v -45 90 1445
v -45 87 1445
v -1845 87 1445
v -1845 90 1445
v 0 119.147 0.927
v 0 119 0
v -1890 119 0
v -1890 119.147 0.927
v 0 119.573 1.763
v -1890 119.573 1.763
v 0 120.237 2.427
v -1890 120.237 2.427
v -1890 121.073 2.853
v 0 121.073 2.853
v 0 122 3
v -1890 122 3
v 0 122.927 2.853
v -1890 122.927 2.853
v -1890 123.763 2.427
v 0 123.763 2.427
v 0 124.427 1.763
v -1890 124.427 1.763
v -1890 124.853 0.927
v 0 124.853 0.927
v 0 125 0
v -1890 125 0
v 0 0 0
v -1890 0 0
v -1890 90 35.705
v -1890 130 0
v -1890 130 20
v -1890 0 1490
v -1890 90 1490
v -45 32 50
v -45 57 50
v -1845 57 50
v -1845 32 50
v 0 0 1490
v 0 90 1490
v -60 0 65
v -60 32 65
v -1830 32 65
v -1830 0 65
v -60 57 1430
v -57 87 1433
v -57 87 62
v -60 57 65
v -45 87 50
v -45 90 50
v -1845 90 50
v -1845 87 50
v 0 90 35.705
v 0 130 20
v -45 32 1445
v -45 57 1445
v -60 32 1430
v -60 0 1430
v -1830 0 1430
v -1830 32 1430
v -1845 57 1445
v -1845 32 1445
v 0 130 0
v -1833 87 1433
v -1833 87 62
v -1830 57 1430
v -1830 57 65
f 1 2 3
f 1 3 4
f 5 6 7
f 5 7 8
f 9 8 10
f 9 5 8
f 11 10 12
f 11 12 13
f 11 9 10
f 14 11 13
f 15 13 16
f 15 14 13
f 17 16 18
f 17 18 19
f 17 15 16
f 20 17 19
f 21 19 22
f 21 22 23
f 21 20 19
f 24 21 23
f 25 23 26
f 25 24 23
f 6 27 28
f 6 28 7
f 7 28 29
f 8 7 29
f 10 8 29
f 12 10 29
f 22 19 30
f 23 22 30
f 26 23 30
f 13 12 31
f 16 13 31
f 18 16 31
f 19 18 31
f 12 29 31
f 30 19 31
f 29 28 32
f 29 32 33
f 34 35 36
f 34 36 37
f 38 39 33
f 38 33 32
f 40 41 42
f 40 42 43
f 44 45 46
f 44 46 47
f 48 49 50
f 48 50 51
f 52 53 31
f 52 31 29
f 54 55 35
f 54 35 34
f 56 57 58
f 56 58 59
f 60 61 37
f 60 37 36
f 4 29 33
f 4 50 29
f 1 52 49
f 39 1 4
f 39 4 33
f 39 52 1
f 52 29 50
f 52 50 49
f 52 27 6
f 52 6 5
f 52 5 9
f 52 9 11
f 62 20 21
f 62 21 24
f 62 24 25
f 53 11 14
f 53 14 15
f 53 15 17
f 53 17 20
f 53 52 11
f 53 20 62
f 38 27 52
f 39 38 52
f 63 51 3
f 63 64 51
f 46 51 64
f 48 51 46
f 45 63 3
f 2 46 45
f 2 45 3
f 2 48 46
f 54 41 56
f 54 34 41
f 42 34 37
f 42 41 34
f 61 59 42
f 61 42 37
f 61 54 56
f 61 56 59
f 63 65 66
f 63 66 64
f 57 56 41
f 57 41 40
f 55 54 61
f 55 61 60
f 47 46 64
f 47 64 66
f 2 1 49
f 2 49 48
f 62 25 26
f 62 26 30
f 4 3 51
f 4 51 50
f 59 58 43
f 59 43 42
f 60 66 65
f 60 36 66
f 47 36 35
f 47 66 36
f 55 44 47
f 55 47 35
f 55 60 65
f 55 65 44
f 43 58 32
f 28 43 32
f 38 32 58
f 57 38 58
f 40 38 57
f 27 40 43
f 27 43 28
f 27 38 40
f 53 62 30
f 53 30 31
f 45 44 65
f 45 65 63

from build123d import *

# Parameters (mm, degrees)
F1_DEPTH = 1890
F3_DEPTH = 1490


with BuildPart() as f1:
    # F0 (on Right) → F1 (new body)
    with BuildSketch(Plane.YZ):
        with BuildLine():
            Line((0, 40), (0, 0))
            Line((0, 0), (119, 0))
            ThreePointArc((119, 0), (122, 3), (125, 0))
            Line((125, 0), (130, 0))
            Line((130, 0), (130, 20))
            Line((130, 20), (90, 35.704561))
            Line((90, 35.704561), (90, 50))
            Line((90, 50), (87, 50))
            Line((87, 50), (57, 50))
            Line((57, 50), (32, 50))
            Line((32, 50), (32, 65))
            Line((32, 65), (0, 65))
            Line((0, 65), (0, 40))
        make_face()
        Polygon((57, 65), (57, 50), (87, 50), (87, 62), align=None)
        Polygon((87, 1433), (87, 1445), (57, 1445), (57, 1430), align=None)
        Polygon((90, 1490), (0, 1490), (0, 1430), (32, 1430), (32, 1445), (57, 1445), (87, 1445), (90, 1445), align=None)
    extrude(amount=-F1_DEPTH)

    # F2 (on face) → F3 (join)
    with BuildSketch(Plane.XY.offset(1490)):
        Polygon((-60, 0), (0, 0), (0, 90), (-45, 90), (-45, 87), (-45, 57), (-45, 32), (-60, 32), align=None)
        Polygon((-45, 57), (-45, 87), (-57, 87), (-60, 57), align=None)
        Polygon((-1890, 90), (-1890, 0), (-1830, 0), (-1830, 32), (-1845, 32), (-1845, 57), (-1845, 87), (-1845, 90), align=None)
        Polygon((-1833, 87), (-1845, 87), (-1845, 57), (-1830, 57), align=None)
    extrude(amount=-F3_DEPTH)


solid = f1.part
